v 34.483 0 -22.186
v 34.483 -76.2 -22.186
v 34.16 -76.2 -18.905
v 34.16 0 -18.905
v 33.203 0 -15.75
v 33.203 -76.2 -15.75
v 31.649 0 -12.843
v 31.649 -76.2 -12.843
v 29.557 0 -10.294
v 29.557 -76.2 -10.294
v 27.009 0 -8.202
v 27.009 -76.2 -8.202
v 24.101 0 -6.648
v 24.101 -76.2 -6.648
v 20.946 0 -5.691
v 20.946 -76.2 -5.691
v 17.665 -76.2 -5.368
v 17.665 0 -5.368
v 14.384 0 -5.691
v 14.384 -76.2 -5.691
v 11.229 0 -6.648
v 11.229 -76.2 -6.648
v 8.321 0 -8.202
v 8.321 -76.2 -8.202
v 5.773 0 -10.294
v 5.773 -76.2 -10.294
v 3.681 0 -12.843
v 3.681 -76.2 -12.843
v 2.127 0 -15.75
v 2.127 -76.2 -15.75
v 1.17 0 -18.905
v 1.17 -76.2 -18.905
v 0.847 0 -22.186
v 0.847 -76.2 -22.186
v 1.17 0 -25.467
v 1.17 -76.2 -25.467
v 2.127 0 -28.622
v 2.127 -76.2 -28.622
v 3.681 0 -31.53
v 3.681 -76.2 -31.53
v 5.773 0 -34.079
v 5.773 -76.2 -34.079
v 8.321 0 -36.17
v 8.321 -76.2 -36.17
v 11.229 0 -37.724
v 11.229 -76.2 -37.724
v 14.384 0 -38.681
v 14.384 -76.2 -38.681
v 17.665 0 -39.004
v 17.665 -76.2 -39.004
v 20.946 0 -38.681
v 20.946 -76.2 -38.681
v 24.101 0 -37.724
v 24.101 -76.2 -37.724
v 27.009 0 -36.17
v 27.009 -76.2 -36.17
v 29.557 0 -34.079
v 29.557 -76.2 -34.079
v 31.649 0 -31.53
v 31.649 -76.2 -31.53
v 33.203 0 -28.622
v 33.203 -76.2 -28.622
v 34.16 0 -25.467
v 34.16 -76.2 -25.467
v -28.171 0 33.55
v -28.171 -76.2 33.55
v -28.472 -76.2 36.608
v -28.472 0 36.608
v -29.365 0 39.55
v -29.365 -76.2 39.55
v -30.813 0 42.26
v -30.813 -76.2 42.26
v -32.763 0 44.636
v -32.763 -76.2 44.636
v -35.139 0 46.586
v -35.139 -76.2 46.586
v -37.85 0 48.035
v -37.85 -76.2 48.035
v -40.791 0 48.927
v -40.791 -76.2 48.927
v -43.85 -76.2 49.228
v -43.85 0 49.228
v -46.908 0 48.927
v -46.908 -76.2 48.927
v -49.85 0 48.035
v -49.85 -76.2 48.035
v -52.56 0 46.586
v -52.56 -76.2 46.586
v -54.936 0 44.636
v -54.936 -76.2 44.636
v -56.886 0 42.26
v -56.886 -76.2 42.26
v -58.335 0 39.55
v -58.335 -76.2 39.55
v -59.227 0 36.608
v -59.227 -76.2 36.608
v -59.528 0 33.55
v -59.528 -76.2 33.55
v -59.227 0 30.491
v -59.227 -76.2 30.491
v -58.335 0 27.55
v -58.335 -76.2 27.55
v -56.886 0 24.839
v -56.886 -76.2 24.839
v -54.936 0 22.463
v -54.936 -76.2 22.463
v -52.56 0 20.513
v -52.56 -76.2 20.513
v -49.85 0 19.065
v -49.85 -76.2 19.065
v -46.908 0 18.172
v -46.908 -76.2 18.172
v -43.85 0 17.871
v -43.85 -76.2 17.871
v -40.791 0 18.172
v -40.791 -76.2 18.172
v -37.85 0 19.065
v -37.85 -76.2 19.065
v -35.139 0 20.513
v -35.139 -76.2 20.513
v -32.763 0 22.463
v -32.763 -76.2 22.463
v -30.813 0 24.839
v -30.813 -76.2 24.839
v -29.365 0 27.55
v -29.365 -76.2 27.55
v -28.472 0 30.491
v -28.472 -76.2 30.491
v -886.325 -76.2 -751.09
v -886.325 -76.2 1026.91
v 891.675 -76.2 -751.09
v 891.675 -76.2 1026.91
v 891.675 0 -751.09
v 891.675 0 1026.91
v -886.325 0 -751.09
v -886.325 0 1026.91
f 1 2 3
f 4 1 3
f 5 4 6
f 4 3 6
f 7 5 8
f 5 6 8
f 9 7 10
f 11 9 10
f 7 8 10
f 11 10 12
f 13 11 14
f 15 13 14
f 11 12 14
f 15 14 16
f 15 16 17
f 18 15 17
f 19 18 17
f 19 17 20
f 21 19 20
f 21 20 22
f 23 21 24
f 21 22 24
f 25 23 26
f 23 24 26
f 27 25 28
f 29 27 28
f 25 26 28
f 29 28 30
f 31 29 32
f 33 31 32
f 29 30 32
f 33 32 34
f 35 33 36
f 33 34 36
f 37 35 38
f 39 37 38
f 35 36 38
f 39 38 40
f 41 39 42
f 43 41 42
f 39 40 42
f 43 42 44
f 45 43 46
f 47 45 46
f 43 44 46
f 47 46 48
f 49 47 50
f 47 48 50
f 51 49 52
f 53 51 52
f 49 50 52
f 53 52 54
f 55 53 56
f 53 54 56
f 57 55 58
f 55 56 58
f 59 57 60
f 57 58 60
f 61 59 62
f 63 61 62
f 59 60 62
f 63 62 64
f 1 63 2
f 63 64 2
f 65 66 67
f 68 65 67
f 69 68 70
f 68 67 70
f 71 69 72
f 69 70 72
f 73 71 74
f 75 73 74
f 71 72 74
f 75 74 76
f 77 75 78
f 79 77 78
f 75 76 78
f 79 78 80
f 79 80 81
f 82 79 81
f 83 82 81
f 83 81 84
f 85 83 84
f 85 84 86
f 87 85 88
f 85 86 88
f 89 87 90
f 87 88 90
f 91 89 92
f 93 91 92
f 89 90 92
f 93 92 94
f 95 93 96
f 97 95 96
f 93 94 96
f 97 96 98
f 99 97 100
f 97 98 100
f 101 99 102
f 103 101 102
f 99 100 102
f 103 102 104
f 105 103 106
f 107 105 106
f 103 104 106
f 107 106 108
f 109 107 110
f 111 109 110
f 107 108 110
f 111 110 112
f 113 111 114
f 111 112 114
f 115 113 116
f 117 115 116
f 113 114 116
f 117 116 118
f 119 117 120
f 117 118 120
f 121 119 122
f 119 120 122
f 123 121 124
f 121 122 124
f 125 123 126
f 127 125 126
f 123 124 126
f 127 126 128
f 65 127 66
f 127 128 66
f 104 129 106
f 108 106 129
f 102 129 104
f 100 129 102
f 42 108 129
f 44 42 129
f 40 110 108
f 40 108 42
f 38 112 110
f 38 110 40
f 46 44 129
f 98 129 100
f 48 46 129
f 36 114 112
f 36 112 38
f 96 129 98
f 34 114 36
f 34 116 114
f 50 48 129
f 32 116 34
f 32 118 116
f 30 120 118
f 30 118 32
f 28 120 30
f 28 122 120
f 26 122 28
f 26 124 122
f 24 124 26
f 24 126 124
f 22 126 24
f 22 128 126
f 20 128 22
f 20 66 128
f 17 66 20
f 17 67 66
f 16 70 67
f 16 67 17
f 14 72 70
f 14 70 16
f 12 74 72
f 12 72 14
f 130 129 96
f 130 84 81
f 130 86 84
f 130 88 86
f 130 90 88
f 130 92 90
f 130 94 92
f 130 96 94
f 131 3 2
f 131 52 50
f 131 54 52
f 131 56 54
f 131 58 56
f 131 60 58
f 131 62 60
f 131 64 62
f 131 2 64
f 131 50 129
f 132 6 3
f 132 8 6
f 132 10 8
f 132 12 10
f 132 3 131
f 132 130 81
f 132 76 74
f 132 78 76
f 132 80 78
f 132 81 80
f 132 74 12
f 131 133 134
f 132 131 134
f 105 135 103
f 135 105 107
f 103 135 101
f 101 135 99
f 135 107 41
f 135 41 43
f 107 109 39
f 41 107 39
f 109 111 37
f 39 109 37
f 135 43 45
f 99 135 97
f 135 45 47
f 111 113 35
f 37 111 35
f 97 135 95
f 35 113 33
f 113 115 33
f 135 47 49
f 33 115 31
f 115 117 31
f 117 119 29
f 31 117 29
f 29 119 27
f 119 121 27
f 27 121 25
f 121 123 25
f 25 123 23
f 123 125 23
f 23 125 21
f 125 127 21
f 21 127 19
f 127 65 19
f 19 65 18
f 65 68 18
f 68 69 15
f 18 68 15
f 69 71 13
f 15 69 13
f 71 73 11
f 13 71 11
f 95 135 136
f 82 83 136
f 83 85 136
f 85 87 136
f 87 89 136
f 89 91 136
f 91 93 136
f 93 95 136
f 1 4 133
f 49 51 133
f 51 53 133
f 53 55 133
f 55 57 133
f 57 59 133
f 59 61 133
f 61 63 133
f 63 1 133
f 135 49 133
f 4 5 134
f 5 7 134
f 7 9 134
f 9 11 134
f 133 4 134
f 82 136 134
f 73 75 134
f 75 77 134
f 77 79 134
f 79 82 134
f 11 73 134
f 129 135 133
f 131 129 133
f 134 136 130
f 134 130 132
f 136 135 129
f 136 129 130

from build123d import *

# Parameters (mm, degrees)
F0_W     = 1778
F0_H     = 1778
F1_DEPTH = 76.2
F2_R     = 15.678622
F2_R_2   = 16.818193
F3_DEPTH = 76.2


with BuildPart() as f1:
    # F0 (on Front) → F1 (new body)
    with BuildSketch(Plane.XZ):
        with Locations((2.674751, 137.909544)):
            Rectangle(F0_W, F0_H)
    extrude(amount=F1_DEPTH)

    # F2 (on face) → F3 (cut, through all)
    with BuildSketch(Plane.XZ.offset(76.2)):
        with Locations((-43.849692, 33.549745)):
            Circle(F2_R)
        with Locations((17.664868, -22.186266)):
            Circle(F2_R_2)
    extrude(amount=-F3_DEPTH, mode=Mode.SUBTRACT)


solid = f1.part
